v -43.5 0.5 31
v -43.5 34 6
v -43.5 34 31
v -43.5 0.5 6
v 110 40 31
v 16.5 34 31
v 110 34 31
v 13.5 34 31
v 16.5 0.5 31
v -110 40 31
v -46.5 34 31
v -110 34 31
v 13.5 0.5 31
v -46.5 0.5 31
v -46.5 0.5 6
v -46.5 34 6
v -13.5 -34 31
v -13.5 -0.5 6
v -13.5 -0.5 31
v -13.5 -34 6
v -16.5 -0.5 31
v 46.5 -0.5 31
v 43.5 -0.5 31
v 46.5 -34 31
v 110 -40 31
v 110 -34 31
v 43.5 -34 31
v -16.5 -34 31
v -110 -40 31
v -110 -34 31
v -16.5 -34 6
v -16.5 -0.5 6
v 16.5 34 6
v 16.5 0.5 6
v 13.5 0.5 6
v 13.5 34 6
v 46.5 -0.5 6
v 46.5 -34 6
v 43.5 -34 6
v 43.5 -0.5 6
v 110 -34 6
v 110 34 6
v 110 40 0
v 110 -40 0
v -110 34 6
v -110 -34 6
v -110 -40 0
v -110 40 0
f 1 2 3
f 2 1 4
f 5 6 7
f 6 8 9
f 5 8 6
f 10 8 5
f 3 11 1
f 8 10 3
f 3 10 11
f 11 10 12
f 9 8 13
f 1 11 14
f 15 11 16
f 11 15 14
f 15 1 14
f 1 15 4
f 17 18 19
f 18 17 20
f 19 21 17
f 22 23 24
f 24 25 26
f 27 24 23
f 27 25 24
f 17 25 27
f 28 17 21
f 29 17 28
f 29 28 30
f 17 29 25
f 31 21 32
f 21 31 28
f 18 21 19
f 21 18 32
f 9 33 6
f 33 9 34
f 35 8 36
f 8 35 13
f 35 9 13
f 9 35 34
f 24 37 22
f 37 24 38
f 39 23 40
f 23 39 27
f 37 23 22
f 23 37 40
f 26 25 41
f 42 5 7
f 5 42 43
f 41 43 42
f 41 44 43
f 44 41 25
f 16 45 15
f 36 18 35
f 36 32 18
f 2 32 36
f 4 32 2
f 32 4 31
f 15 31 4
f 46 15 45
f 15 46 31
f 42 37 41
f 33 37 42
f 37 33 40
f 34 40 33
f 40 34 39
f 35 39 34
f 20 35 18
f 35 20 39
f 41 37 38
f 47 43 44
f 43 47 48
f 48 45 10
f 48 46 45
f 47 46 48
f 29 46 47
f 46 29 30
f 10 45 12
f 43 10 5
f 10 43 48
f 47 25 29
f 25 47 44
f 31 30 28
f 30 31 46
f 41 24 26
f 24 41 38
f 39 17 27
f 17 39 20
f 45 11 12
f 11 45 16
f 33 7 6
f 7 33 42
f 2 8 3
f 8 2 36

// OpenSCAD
$fn = 32;

// ----------------------------------------------------------------------
// Rib frame 220 x 80 x 31
// 4 ribs at 30 mm pitch, staggered
// ----------------------------------------------------------------------

// --- parameters (mm) ---
frame = [220, 80, 6];  // base plate size (x, y, z)
seat_tol = 0.1;        // tolerance at the seating features
free_tol = 0.5;        // general tolerance on the free sizes
rail_w = 6;            // side rail width
ribs = 4;              // number of ribs
rib_t = 3;             // rib thickness
rib_h = 25;            // rib height above the base plate
pitch = 30;            // pitch between rib centres

// --- derived feature positions (mm) ---
span = (ribs - 1) * pitch;          // = 90   distance between the outer ribs
origin_x = -span / 2;               // = -45   X of the first rib
rib_len = frame[1] / 2 - rail_w + 0.5;  // = 34.5   length of a staggered rib
rib_y = 0.5 + rib_len / 2;          // = 17.75   Y of a staggered rib centre
row_offset = 2 * rib_y;             // = 35.5   distance between the two rows
feature_centers = [
  [origin_x + 0 * pitch, rib_y],
  [origin_x + 1 * pitch, -rib_y],
  [origin_x + 2 * pitch, rib_y],
  [origin_x + 3 * pitch, -rib_y]
];   // rib centre line, drives the rib loop

// base plate, two side rails, then the ribs read straight off feature_centers
union() {
  translate([-frame[0] / 2, -frame[1] / 2, 0]) cube(frame);
  translate([-frame[0] / 2, -frame[1] / 2, 0]) cube([frame[0], rail_w, frame[2] + rib_h]);
  translate([-frame[0] / 2, frame[1] / 2 - rail_w, 0]) cube([frame[0], rail_w, frame[2] + rib_h]);
  for (centre = feature_centers)
    translate([centre[0] - rib_t / 2, centre[1] - rib_len / 2, frame[2] - 1])
      cube([rib_t, rib_len, rib_h + 1]);
}
